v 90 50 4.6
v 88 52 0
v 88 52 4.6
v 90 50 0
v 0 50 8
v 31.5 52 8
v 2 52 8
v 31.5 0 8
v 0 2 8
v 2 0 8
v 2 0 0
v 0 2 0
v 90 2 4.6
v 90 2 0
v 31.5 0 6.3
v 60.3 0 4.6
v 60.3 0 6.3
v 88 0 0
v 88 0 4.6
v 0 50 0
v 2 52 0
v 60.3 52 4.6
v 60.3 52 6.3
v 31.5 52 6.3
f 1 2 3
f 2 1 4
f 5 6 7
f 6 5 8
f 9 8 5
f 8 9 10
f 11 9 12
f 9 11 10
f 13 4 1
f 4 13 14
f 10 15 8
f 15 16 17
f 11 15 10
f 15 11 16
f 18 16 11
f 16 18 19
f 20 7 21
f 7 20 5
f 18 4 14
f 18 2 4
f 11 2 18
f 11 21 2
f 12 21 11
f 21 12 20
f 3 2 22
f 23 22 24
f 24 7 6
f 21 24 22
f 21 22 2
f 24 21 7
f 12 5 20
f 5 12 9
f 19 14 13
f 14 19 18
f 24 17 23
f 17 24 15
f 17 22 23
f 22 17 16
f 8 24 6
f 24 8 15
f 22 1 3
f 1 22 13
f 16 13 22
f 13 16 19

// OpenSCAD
$fn = 32;

// ----------------------------------------------------------------------
// Stepped bar: twostep, 90 x 52 x 8/4.6 mm
// ----------------------------------------------------------------------

// --- parameters (mm) ---
bar_l = 90;               // bar length, X
bar_w = 52;               // bar width, Y
plate_t = 8;              // thickness of the thick zone, Z
thin_t = 4.6;             // thickness of the thin zone
corner_c = 2;             // corner chamfer of the bar
step_cut = 3.4;           // material removed from the thin zone
stair1_x = 31.5;          // position of the first stair
stair2_x = 60.3;          // position of the second stair
mid_t = 6.3;              // thickness of the middle zone
depth_1 = 1.7;            // depth of cut 1 from the top face
depth_2 = 3.4;            // depth of cut 2 from the top face

profile = [[2, 0], [88, 0], [90, 2], [90, 50], [88, 52], [2, 52], [0, 50], [0, 2]];  // primary outline, 8 points, counter clockwise
void_1 = [[31.5, -1], [60.3, -1], [60.3, 53], [31.5, 53]];  // first stair, 4 points
void_2 = [[60.3, -1], [91, -1], [91, 53], [60.3, 53]];  // second stair, 4 points

// --- the one profile operation ---
difference() {
  linear_extrude(height = plate_t) polygon(points = profile);
  translate([0, 0, plate_t - depth_1])
    linear_extrude(height = depth_1 + 1) polygon(points = void_1);
  translate([0, 0, plate_t - depth_2])
    linear_extrude(height = depth_2 + 1) polygon(points = void_2);
}
